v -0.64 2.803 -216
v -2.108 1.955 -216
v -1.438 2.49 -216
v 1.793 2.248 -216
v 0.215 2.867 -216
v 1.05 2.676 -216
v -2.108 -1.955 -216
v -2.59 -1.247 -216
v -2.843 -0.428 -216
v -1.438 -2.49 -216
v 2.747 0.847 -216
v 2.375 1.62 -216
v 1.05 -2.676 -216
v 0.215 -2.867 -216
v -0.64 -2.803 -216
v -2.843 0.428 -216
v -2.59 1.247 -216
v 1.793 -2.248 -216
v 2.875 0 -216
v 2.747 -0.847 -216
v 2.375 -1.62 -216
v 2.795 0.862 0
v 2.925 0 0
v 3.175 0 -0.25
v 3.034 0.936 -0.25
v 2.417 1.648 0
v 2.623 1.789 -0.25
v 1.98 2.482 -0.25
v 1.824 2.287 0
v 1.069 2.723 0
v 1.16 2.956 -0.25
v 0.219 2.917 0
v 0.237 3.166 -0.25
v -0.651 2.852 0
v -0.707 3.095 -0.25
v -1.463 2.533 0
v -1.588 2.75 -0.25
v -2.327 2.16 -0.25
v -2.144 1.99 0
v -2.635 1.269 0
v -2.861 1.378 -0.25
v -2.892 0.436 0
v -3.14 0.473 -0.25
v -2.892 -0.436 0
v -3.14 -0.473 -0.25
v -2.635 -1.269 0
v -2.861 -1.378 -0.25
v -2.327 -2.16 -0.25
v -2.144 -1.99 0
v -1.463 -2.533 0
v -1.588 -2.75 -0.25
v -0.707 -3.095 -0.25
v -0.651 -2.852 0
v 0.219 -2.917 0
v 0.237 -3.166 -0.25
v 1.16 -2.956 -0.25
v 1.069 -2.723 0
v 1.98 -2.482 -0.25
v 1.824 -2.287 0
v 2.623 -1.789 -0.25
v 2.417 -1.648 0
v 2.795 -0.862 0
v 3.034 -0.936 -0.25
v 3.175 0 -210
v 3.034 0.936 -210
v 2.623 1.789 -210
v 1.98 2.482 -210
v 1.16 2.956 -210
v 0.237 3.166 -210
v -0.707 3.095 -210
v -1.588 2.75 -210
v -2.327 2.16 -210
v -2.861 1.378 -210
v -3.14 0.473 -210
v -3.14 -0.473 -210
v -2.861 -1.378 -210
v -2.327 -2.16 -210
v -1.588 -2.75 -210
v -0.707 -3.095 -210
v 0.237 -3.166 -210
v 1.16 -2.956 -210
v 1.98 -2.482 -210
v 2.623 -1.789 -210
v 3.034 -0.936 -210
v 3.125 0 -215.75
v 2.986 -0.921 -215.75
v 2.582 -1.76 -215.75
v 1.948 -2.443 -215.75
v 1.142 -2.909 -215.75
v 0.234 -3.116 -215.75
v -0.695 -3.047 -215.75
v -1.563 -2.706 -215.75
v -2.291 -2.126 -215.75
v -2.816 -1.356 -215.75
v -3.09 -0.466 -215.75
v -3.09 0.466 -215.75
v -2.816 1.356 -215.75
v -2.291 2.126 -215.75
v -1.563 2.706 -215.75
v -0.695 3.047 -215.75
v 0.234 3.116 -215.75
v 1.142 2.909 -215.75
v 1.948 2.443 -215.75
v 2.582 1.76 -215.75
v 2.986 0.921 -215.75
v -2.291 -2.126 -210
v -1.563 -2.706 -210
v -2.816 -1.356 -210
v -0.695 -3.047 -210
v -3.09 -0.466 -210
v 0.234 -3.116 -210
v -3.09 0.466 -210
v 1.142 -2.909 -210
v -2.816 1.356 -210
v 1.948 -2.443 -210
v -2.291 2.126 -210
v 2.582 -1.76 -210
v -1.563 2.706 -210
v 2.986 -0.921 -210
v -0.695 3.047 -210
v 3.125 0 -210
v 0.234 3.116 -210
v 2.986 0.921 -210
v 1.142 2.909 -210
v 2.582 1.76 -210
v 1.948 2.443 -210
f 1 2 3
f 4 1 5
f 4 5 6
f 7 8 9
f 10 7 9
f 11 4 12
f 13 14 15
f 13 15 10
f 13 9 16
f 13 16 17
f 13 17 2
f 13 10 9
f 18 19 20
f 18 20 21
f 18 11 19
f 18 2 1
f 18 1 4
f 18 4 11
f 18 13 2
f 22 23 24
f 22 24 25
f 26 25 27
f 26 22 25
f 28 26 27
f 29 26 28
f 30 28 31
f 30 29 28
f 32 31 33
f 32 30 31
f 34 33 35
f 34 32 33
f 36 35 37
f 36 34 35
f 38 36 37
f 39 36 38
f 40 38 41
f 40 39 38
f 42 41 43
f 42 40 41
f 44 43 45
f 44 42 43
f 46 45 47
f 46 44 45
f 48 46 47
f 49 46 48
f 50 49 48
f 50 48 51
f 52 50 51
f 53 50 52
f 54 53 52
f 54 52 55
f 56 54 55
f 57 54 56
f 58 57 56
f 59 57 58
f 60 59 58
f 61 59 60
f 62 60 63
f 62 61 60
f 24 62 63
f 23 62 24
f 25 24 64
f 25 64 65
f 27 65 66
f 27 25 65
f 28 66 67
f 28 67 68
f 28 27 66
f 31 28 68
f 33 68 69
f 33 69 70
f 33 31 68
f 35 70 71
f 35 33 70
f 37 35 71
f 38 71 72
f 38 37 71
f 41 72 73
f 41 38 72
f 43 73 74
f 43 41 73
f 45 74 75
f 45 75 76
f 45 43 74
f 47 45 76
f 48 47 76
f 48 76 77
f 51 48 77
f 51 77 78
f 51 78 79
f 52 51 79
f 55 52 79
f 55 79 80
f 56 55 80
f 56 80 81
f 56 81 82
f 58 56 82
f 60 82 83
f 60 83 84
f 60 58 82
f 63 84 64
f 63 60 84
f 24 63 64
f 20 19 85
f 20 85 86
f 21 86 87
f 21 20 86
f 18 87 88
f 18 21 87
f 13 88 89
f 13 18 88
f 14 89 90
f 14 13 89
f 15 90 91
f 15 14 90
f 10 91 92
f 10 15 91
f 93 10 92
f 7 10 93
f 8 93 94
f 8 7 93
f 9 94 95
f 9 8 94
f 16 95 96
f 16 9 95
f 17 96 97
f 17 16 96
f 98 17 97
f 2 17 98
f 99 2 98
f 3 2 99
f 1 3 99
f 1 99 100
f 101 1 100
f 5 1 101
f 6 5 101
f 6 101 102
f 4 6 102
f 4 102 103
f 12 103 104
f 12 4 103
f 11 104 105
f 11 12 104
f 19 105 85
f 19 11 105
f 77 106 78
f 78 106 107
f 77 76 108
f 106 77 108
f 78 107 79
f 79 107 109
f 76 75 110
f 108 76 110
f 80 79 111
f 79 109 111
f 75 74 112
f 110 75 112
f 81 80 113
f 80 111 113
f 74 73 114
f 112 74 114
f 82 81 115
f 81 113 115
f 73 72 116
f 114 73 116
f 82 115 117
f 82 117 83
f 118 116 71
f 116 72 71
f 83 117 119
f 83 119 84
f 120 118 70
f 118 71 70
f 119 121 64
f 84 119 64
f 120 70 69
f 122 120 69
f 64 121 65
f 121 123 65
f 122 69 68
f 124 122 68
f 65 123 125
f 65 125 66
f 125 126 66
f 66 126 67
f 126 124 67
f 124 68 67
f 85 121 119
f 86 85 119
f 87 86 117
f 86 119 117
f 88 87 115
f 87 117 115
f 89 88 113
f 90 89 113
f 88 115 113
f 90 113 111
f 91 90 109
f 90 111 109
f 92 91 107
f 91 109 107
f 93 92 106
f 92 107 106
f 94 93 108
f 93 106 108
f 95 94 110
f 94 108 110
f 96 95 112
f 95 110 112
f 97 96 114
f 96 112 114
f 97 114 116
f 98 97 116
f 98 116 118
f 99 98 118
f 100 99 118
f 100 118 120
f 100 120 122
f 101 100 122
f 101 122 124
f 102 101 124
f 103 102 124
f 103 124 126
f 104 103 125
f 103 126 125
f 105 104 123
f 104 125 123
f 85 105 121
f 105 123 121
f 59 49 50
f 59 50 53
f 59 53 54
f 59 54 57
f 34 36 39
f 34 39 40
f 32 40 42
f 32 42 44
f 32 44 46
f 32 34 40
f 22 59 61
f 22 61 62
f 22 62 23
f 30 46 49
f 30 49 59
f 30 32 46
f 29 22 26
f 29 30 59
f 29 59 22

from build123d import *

# Parameters (mm, degrees)
F0_R     = 3.175
F1_DEPTH = 210
F2_R     = 3.125
F3_DEPTH = 6
F4_SIZE  = 0.25
F5_SIZE  = 0.25


with BuildPart() as f1:
    # F0 (on Top) → F1 (new body)
    with BuildSketch(Plane.XY):
        Circle(F0_R)
    extrude(amount=-F1_DEPTH)

    # F2 (on face) → F3 (join)
    with BuildSketch(Plane(origin=(0, 0, -210), x_dir=(1, 0, 0), z_dir=(0, 0, -1))):
        Circle(F2_R)
    extrude(amount=F3_DEPTH)

    # F4
    f4_edges = [f1.edges().sort_by_distance(p)[0] for p in [
        (-3.125, 0, -216),
    ]]
    chamfer(f4_edges, length=F4_SIZE)

    # F5
    f5_edges = [f1.edges().sort_by_distance(p)[0] for p in [
        (-3.175, 0, 0),
    ]]
    chamfer(f5_edges, length=F5_SIZE)


solid = f1.part
